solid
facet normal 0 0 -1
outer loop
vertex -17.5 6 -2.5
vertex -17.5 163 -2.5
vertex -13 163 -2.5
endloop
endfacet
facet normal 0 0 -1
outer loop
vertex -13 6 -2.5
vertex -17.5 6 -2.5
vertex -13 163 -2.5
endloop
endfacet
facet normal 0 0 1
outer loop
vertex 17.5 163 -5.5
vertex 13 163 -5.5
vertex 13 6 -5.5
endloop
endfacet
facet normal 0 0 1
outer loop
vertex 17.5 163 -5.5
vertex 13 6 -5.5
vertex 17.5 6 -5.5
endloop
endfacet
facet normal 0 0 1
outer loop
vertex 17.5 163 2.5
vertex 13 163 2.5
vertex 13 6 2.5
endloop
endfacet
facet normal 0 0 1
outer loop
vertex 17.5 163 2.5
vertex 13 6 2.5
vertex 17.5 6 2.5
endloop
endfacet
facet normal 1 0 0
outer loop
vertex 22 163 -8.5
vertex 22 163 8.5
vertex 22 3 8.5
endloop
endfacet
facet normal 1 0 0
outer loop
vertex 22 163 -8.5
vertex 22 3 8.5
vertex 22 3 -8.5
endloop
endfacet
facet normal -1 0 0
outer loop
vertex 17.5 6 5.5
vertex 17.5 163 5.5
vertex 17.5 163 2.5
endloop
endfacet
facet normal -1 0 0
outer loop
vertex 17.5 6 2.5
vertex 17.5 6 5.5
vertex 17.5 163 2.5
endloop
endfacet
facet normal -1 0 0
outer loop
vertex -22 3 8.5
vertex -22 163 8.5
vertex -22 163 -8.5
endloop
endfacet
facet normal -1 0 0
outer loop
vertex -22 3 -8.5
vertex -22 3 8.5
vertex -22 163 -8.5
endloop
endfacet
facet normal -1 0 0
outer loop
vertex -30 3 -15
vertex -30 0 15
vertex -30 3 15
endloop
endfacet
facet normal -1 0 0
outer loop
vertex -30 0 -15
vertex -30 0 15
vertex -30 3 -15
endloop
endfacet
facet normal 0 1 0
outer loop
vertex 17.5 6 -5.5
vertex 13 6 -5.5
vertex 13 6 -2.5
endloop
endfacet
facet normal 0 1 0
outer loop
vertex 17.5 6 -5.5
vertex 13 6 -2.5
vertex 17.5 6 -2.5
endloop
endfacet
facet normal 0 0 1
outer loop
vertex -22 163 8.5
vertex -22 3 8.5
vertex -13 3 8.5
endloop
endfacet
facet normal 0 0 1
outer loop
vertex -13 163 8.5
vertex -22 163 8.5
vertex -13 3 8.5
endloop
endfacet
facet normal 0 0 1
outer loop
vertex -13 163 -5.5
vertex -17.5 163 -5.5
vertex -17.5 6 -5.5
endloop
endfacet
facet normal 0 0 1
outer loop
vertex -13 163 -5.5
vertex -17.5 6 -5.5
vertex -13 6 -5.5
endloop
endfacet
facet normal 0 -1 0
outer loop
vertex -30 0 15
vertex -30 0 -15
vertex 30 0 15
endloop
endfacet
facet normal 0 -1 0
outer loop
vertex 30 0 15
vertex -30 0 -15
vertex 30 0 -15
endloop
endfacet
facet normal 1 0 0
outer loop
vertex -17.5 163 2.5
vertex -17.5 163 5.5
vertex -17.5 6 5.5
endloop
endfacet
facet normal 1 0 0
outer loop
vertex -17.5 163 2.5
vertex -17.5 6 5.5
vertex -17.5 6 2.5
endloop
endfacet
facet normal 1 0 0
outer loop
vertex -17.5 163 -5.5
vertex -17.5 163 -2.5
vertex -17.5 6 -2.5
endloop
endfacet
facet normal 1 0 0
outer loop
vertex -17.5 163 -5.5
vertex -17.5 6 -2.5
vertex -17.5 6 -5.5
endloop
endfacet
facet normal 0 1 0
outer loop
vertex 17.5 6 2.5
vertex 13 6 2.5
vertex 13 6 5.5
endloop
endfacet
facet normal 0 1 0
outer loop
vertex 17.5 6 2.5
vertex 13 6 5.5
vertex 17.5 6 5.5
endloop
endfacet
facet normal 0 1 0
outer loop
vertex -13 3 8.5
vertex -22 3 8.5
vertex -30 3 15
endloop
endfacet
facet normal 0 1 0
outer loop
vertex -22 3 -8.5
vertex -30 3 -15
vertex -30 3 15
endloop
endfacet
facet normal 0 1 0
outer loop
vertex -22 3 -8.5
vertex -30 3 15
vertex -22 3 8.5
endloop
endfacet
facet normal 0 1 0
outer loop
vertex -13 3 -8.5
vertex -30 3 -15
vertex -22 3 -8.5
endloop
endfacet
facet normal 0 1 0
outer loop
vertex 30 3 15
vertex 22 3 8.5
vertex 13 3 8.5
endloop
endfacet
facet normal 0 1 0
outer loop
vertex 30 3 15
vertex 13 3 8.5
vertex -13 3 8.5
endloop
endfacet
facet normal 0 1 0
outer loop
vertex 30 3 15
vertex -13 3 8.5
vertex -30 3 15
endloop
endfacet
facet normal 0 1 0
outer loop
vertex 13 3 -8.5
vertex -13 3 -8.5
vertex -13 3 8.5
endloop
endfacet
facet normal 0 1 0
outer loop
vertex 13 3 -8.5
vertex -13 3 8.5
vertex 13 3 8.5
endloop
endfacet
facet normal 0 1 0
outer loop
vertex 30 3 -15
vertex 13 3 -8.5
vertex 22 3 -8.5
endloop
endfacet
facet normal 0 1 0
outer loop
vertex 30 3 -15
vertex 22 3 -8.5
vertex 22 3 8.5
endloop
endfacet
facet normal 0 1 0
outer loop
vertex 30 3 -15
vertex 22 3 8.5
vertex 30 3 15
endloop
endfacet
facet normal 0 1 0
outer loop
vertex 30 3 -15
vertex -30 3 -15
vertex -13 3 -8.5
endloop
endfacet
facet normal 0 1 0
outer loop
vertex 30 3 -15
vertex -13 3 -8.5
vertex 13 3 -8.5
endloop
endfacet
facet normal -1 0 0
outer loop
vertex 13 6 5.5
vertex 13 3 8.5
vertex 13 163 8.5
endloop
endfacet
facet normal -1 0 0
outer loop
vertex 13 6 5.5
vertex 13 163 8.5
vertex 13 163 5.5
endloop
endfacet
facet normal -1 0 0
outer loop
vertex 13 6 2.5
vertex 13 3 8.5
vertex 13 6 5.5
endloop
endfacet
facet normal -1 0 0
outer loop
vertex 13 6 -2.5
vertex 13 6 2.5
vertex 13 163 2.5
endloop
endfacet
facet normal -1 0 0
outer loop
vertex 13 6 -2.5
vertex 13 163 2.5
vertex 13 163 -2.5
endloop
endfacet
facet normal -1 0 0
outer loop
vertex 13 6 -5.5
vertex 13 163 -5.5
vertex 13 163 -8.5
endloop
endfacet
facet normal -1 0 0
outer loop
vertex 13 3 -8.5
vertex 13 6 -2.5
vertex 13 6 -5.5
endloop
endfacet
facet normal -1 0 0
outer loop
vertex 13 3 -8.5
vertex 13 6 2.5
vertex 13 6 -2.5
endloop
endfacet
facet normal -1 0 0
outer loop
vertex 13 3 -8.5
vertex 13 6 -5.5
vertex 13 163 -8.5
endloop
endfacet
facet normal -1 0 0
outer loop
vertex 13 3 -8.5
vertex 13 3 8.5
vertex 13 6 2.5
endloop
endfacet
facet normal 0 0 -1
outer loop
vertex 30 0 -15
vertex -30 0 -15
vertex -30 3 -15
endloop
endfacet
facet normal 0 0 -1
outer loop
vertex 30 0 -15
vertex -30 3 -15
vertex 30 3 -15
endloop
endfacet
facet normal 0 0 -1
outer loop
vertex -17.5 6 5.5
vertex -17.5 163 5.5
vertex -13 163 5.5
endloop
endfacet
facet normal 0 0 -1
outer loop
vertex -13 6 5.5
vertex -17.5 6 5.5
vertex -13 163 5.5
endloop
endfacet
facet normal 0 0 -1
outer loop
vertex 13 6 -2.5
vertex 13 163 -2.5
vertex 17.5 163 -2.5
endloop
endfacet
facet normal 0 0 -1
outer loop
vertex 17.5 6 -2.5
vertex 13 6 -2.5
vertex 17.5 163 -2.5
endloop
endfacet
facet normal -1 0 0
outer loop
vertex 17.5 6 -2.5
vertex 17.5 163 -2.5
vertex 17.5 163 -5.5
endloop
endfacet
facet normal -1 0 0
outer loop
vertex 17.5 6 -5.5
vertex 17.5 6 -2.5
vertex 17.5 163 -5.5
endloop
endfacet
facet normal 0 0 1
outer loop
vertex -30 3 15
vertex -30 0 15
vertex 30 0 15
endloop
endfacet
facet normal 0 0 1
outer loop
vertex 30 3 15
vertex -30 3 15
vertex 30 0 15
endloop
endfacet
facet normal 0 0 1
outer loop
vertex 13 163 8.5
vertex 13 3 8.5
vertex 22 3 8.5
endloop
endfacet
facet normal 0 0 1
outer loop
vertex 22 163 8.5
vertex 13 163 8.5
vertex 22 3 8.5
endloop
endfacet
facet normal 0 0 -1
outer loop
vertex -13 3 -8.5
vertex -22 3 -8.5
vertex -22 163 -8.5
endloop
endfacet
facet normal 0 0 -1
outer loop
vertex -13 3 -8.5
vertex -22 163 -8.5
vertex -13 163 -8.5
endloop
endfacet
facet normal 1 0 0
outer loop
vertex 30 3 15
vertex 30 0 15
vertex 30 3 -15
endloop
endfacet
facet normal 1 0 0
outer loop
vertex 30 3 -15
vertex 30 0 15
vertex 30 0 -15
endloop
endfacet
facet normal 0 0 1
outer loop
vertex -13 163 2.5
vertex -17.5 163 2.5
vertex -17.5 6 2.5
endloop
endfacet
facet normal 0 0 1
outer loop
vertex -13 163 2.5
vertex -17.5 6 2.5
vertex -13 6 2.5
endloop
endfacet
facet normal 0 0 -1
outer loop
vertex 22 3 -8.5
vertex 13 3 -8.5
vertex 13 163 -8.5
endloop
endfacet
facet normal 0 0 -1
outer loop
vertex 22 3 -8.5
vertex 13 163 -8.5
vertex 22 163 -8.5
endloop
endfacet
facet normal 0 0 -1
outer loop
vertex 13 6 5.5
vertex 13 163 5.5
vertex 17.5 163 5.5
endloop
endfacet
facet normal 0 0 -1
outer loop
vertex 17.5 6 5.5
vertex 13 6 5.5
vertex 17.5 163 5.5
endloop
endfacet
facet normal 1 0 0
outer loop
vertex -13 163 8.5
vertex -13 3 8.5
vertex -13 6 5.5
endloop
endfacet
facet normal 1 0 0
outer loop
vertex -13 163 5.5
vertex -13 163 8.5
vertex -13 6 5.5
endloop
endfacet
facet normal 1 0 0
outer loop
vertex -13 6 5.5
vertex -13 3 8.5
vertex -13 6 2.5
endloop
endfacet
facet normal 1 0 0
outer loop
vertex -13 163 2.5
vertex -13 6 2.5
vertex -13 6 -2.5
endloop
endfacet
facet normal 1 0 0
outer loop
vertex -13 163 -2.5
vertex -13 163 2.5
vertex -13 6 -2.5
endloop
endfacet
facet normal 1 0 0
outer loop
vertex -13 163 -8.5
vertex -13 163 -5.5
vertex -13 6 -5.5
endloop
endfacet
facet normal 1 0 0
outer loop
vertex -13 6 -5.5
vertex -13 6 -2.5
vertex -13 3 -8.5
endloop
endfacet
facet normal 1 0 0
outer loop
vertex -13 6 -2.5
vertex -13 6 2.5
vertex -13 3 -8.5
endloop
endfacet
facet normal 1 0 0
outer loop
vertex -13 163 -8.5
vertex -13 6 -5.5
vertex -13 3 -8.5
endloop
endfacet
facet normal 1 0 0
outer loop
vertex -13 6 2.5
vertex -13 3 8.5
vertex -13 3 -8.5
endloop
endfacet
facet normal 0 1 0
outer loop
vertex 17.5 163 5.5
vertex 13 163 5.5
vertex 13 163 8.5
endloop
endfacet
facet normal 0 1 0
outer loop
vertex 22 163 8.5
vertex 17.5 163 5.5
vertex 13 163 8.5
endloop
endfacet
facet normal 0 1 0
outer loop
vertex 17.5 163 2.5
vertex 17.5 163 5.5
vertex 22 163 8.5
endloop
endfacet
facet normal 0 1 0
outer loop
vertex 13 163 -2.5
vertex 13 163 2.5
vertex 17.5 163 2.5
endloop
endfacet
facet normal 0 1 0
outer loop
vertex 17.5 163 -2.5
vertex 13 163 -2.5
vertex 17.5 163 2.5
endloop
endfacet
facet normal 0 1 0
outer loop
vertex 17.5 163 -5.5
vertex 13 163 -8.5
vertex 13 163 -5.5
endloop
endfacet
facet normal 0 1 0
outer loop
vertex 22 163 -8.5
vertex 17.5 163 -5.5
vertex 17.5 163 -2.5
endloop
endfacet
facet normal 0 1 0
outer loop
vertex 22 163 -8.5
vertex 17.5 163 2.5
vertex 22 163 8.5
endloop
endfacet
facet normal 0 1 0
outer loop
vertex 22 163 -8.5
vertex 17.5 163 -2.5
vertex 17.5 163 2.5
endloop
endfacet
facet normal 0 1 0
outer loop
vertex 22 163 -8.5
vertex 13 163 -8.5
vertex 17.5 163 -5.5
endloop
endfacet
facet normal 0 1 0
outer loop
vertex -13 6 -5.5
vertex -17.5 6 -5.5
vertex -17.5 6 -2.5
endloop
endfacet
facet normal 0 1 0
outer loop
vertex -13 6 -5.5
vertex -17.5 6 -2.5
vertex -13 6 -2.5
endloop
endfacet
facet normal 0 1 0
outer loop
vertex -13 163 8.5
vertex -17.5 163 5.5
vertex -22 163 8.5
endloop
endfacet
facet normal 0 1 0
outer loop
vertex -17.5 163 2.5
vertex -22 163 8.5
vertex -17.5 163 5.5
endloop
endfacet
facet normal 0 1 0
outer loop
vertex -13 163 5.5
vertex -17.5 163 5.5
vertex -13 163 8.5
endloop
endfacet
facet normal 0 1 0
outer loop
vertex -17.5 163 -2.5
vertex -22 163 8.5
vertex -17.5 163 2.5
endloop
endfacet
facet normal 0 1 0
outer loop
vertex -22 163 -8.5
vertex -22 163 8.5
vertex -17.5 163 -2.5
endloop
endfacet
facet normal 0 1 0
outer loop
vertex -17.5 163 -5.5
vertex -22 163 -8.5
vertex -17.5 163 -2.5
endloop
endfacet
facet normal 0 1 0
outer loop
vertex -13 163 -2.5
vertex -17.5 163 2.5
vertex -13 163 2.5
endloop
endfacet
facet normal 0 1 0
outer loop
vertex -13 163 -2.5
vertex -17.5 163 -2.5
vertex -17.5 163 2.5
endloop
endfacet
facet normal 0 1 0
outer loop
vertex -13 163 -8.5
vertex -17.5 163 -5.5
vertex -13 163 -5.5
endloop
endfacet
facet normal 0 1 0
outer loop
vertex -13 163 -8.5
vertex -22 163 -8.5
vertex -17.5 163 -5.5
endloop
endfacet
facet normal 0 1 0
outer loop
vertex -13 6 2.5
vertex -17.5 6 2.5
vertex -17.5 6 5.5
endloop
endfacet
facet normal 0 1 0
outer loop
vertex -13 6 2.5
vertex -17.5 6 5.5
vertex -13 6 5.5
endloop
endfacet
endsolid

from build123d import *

# Parameters (mm, degrees)
SKETCH1_W           = 60
SKETCH1_H           = 30
BOSS_EXTRUDE1_DEPTH = 3
SKETCH2_W           = 9
SKETCH2_H           = 17
BOSS_EXTRUDE2_DEPTH = 160
SKETCH3_W           = 4.5
SKETCH3_H           = 3
CUT_EXTRUDE1_DEPTH  = 157


with BuildPart() as part:
    # Sketch1 → Boss-Extrude1 (new body)
    with BuildSketch(Plane(origin=(0, 0, 0), x_dir=(1, 0, 0), z_dir=(0, 1, 0))):
        Rectangle(SKETCH1_W, SKETCH1_H)
    extrude(amount=BOSS_EXTRUDE1_DEPTH)

    # Sketch2 → Boss-Extrude2 (add)
    with BuildSketch(Plane(origin=(0, 3, 0), x_dir=(1, 0, 0), z_dir=(0, 1, 0))):
        with Locations((17.5, 0)):
            Rectangle(SKETCH2_W, SKETCH2_H)
        with Locations((-17.5, 0)):
            Rectangle(SKETCH2_W, SKETCH2_H)
    extrude(amount=BOSS_EXTRUDE2_DEPTH)

    # Sketch3 → Cut-Extrude1 (cut)
    with BuildSketch(Plane(origin=(0, 163, 0), x_dir=(1, 0, 0), z_dir=(0, 1, 0))):
        with Locations((-15.25, 4)):
            Rectangle(SKETCH3_W, SKETCH3_H)
        with Locations((-15.25, -4)):
            Rectangle(SKETCH3_W, SKETCH3_H)
        with Locations((15.25, -4)):
            Rectangle(SKETCH3_W, SKETCH3_H)
        with Locations((15.25, 4)):
            Rectangle(SKETCH3_W, SKETCH3_H)
    extrude(amount=-CUT_EXTRUDE1_DEPTH, mode=Mode.SUBTRACT)


solid = part.part
